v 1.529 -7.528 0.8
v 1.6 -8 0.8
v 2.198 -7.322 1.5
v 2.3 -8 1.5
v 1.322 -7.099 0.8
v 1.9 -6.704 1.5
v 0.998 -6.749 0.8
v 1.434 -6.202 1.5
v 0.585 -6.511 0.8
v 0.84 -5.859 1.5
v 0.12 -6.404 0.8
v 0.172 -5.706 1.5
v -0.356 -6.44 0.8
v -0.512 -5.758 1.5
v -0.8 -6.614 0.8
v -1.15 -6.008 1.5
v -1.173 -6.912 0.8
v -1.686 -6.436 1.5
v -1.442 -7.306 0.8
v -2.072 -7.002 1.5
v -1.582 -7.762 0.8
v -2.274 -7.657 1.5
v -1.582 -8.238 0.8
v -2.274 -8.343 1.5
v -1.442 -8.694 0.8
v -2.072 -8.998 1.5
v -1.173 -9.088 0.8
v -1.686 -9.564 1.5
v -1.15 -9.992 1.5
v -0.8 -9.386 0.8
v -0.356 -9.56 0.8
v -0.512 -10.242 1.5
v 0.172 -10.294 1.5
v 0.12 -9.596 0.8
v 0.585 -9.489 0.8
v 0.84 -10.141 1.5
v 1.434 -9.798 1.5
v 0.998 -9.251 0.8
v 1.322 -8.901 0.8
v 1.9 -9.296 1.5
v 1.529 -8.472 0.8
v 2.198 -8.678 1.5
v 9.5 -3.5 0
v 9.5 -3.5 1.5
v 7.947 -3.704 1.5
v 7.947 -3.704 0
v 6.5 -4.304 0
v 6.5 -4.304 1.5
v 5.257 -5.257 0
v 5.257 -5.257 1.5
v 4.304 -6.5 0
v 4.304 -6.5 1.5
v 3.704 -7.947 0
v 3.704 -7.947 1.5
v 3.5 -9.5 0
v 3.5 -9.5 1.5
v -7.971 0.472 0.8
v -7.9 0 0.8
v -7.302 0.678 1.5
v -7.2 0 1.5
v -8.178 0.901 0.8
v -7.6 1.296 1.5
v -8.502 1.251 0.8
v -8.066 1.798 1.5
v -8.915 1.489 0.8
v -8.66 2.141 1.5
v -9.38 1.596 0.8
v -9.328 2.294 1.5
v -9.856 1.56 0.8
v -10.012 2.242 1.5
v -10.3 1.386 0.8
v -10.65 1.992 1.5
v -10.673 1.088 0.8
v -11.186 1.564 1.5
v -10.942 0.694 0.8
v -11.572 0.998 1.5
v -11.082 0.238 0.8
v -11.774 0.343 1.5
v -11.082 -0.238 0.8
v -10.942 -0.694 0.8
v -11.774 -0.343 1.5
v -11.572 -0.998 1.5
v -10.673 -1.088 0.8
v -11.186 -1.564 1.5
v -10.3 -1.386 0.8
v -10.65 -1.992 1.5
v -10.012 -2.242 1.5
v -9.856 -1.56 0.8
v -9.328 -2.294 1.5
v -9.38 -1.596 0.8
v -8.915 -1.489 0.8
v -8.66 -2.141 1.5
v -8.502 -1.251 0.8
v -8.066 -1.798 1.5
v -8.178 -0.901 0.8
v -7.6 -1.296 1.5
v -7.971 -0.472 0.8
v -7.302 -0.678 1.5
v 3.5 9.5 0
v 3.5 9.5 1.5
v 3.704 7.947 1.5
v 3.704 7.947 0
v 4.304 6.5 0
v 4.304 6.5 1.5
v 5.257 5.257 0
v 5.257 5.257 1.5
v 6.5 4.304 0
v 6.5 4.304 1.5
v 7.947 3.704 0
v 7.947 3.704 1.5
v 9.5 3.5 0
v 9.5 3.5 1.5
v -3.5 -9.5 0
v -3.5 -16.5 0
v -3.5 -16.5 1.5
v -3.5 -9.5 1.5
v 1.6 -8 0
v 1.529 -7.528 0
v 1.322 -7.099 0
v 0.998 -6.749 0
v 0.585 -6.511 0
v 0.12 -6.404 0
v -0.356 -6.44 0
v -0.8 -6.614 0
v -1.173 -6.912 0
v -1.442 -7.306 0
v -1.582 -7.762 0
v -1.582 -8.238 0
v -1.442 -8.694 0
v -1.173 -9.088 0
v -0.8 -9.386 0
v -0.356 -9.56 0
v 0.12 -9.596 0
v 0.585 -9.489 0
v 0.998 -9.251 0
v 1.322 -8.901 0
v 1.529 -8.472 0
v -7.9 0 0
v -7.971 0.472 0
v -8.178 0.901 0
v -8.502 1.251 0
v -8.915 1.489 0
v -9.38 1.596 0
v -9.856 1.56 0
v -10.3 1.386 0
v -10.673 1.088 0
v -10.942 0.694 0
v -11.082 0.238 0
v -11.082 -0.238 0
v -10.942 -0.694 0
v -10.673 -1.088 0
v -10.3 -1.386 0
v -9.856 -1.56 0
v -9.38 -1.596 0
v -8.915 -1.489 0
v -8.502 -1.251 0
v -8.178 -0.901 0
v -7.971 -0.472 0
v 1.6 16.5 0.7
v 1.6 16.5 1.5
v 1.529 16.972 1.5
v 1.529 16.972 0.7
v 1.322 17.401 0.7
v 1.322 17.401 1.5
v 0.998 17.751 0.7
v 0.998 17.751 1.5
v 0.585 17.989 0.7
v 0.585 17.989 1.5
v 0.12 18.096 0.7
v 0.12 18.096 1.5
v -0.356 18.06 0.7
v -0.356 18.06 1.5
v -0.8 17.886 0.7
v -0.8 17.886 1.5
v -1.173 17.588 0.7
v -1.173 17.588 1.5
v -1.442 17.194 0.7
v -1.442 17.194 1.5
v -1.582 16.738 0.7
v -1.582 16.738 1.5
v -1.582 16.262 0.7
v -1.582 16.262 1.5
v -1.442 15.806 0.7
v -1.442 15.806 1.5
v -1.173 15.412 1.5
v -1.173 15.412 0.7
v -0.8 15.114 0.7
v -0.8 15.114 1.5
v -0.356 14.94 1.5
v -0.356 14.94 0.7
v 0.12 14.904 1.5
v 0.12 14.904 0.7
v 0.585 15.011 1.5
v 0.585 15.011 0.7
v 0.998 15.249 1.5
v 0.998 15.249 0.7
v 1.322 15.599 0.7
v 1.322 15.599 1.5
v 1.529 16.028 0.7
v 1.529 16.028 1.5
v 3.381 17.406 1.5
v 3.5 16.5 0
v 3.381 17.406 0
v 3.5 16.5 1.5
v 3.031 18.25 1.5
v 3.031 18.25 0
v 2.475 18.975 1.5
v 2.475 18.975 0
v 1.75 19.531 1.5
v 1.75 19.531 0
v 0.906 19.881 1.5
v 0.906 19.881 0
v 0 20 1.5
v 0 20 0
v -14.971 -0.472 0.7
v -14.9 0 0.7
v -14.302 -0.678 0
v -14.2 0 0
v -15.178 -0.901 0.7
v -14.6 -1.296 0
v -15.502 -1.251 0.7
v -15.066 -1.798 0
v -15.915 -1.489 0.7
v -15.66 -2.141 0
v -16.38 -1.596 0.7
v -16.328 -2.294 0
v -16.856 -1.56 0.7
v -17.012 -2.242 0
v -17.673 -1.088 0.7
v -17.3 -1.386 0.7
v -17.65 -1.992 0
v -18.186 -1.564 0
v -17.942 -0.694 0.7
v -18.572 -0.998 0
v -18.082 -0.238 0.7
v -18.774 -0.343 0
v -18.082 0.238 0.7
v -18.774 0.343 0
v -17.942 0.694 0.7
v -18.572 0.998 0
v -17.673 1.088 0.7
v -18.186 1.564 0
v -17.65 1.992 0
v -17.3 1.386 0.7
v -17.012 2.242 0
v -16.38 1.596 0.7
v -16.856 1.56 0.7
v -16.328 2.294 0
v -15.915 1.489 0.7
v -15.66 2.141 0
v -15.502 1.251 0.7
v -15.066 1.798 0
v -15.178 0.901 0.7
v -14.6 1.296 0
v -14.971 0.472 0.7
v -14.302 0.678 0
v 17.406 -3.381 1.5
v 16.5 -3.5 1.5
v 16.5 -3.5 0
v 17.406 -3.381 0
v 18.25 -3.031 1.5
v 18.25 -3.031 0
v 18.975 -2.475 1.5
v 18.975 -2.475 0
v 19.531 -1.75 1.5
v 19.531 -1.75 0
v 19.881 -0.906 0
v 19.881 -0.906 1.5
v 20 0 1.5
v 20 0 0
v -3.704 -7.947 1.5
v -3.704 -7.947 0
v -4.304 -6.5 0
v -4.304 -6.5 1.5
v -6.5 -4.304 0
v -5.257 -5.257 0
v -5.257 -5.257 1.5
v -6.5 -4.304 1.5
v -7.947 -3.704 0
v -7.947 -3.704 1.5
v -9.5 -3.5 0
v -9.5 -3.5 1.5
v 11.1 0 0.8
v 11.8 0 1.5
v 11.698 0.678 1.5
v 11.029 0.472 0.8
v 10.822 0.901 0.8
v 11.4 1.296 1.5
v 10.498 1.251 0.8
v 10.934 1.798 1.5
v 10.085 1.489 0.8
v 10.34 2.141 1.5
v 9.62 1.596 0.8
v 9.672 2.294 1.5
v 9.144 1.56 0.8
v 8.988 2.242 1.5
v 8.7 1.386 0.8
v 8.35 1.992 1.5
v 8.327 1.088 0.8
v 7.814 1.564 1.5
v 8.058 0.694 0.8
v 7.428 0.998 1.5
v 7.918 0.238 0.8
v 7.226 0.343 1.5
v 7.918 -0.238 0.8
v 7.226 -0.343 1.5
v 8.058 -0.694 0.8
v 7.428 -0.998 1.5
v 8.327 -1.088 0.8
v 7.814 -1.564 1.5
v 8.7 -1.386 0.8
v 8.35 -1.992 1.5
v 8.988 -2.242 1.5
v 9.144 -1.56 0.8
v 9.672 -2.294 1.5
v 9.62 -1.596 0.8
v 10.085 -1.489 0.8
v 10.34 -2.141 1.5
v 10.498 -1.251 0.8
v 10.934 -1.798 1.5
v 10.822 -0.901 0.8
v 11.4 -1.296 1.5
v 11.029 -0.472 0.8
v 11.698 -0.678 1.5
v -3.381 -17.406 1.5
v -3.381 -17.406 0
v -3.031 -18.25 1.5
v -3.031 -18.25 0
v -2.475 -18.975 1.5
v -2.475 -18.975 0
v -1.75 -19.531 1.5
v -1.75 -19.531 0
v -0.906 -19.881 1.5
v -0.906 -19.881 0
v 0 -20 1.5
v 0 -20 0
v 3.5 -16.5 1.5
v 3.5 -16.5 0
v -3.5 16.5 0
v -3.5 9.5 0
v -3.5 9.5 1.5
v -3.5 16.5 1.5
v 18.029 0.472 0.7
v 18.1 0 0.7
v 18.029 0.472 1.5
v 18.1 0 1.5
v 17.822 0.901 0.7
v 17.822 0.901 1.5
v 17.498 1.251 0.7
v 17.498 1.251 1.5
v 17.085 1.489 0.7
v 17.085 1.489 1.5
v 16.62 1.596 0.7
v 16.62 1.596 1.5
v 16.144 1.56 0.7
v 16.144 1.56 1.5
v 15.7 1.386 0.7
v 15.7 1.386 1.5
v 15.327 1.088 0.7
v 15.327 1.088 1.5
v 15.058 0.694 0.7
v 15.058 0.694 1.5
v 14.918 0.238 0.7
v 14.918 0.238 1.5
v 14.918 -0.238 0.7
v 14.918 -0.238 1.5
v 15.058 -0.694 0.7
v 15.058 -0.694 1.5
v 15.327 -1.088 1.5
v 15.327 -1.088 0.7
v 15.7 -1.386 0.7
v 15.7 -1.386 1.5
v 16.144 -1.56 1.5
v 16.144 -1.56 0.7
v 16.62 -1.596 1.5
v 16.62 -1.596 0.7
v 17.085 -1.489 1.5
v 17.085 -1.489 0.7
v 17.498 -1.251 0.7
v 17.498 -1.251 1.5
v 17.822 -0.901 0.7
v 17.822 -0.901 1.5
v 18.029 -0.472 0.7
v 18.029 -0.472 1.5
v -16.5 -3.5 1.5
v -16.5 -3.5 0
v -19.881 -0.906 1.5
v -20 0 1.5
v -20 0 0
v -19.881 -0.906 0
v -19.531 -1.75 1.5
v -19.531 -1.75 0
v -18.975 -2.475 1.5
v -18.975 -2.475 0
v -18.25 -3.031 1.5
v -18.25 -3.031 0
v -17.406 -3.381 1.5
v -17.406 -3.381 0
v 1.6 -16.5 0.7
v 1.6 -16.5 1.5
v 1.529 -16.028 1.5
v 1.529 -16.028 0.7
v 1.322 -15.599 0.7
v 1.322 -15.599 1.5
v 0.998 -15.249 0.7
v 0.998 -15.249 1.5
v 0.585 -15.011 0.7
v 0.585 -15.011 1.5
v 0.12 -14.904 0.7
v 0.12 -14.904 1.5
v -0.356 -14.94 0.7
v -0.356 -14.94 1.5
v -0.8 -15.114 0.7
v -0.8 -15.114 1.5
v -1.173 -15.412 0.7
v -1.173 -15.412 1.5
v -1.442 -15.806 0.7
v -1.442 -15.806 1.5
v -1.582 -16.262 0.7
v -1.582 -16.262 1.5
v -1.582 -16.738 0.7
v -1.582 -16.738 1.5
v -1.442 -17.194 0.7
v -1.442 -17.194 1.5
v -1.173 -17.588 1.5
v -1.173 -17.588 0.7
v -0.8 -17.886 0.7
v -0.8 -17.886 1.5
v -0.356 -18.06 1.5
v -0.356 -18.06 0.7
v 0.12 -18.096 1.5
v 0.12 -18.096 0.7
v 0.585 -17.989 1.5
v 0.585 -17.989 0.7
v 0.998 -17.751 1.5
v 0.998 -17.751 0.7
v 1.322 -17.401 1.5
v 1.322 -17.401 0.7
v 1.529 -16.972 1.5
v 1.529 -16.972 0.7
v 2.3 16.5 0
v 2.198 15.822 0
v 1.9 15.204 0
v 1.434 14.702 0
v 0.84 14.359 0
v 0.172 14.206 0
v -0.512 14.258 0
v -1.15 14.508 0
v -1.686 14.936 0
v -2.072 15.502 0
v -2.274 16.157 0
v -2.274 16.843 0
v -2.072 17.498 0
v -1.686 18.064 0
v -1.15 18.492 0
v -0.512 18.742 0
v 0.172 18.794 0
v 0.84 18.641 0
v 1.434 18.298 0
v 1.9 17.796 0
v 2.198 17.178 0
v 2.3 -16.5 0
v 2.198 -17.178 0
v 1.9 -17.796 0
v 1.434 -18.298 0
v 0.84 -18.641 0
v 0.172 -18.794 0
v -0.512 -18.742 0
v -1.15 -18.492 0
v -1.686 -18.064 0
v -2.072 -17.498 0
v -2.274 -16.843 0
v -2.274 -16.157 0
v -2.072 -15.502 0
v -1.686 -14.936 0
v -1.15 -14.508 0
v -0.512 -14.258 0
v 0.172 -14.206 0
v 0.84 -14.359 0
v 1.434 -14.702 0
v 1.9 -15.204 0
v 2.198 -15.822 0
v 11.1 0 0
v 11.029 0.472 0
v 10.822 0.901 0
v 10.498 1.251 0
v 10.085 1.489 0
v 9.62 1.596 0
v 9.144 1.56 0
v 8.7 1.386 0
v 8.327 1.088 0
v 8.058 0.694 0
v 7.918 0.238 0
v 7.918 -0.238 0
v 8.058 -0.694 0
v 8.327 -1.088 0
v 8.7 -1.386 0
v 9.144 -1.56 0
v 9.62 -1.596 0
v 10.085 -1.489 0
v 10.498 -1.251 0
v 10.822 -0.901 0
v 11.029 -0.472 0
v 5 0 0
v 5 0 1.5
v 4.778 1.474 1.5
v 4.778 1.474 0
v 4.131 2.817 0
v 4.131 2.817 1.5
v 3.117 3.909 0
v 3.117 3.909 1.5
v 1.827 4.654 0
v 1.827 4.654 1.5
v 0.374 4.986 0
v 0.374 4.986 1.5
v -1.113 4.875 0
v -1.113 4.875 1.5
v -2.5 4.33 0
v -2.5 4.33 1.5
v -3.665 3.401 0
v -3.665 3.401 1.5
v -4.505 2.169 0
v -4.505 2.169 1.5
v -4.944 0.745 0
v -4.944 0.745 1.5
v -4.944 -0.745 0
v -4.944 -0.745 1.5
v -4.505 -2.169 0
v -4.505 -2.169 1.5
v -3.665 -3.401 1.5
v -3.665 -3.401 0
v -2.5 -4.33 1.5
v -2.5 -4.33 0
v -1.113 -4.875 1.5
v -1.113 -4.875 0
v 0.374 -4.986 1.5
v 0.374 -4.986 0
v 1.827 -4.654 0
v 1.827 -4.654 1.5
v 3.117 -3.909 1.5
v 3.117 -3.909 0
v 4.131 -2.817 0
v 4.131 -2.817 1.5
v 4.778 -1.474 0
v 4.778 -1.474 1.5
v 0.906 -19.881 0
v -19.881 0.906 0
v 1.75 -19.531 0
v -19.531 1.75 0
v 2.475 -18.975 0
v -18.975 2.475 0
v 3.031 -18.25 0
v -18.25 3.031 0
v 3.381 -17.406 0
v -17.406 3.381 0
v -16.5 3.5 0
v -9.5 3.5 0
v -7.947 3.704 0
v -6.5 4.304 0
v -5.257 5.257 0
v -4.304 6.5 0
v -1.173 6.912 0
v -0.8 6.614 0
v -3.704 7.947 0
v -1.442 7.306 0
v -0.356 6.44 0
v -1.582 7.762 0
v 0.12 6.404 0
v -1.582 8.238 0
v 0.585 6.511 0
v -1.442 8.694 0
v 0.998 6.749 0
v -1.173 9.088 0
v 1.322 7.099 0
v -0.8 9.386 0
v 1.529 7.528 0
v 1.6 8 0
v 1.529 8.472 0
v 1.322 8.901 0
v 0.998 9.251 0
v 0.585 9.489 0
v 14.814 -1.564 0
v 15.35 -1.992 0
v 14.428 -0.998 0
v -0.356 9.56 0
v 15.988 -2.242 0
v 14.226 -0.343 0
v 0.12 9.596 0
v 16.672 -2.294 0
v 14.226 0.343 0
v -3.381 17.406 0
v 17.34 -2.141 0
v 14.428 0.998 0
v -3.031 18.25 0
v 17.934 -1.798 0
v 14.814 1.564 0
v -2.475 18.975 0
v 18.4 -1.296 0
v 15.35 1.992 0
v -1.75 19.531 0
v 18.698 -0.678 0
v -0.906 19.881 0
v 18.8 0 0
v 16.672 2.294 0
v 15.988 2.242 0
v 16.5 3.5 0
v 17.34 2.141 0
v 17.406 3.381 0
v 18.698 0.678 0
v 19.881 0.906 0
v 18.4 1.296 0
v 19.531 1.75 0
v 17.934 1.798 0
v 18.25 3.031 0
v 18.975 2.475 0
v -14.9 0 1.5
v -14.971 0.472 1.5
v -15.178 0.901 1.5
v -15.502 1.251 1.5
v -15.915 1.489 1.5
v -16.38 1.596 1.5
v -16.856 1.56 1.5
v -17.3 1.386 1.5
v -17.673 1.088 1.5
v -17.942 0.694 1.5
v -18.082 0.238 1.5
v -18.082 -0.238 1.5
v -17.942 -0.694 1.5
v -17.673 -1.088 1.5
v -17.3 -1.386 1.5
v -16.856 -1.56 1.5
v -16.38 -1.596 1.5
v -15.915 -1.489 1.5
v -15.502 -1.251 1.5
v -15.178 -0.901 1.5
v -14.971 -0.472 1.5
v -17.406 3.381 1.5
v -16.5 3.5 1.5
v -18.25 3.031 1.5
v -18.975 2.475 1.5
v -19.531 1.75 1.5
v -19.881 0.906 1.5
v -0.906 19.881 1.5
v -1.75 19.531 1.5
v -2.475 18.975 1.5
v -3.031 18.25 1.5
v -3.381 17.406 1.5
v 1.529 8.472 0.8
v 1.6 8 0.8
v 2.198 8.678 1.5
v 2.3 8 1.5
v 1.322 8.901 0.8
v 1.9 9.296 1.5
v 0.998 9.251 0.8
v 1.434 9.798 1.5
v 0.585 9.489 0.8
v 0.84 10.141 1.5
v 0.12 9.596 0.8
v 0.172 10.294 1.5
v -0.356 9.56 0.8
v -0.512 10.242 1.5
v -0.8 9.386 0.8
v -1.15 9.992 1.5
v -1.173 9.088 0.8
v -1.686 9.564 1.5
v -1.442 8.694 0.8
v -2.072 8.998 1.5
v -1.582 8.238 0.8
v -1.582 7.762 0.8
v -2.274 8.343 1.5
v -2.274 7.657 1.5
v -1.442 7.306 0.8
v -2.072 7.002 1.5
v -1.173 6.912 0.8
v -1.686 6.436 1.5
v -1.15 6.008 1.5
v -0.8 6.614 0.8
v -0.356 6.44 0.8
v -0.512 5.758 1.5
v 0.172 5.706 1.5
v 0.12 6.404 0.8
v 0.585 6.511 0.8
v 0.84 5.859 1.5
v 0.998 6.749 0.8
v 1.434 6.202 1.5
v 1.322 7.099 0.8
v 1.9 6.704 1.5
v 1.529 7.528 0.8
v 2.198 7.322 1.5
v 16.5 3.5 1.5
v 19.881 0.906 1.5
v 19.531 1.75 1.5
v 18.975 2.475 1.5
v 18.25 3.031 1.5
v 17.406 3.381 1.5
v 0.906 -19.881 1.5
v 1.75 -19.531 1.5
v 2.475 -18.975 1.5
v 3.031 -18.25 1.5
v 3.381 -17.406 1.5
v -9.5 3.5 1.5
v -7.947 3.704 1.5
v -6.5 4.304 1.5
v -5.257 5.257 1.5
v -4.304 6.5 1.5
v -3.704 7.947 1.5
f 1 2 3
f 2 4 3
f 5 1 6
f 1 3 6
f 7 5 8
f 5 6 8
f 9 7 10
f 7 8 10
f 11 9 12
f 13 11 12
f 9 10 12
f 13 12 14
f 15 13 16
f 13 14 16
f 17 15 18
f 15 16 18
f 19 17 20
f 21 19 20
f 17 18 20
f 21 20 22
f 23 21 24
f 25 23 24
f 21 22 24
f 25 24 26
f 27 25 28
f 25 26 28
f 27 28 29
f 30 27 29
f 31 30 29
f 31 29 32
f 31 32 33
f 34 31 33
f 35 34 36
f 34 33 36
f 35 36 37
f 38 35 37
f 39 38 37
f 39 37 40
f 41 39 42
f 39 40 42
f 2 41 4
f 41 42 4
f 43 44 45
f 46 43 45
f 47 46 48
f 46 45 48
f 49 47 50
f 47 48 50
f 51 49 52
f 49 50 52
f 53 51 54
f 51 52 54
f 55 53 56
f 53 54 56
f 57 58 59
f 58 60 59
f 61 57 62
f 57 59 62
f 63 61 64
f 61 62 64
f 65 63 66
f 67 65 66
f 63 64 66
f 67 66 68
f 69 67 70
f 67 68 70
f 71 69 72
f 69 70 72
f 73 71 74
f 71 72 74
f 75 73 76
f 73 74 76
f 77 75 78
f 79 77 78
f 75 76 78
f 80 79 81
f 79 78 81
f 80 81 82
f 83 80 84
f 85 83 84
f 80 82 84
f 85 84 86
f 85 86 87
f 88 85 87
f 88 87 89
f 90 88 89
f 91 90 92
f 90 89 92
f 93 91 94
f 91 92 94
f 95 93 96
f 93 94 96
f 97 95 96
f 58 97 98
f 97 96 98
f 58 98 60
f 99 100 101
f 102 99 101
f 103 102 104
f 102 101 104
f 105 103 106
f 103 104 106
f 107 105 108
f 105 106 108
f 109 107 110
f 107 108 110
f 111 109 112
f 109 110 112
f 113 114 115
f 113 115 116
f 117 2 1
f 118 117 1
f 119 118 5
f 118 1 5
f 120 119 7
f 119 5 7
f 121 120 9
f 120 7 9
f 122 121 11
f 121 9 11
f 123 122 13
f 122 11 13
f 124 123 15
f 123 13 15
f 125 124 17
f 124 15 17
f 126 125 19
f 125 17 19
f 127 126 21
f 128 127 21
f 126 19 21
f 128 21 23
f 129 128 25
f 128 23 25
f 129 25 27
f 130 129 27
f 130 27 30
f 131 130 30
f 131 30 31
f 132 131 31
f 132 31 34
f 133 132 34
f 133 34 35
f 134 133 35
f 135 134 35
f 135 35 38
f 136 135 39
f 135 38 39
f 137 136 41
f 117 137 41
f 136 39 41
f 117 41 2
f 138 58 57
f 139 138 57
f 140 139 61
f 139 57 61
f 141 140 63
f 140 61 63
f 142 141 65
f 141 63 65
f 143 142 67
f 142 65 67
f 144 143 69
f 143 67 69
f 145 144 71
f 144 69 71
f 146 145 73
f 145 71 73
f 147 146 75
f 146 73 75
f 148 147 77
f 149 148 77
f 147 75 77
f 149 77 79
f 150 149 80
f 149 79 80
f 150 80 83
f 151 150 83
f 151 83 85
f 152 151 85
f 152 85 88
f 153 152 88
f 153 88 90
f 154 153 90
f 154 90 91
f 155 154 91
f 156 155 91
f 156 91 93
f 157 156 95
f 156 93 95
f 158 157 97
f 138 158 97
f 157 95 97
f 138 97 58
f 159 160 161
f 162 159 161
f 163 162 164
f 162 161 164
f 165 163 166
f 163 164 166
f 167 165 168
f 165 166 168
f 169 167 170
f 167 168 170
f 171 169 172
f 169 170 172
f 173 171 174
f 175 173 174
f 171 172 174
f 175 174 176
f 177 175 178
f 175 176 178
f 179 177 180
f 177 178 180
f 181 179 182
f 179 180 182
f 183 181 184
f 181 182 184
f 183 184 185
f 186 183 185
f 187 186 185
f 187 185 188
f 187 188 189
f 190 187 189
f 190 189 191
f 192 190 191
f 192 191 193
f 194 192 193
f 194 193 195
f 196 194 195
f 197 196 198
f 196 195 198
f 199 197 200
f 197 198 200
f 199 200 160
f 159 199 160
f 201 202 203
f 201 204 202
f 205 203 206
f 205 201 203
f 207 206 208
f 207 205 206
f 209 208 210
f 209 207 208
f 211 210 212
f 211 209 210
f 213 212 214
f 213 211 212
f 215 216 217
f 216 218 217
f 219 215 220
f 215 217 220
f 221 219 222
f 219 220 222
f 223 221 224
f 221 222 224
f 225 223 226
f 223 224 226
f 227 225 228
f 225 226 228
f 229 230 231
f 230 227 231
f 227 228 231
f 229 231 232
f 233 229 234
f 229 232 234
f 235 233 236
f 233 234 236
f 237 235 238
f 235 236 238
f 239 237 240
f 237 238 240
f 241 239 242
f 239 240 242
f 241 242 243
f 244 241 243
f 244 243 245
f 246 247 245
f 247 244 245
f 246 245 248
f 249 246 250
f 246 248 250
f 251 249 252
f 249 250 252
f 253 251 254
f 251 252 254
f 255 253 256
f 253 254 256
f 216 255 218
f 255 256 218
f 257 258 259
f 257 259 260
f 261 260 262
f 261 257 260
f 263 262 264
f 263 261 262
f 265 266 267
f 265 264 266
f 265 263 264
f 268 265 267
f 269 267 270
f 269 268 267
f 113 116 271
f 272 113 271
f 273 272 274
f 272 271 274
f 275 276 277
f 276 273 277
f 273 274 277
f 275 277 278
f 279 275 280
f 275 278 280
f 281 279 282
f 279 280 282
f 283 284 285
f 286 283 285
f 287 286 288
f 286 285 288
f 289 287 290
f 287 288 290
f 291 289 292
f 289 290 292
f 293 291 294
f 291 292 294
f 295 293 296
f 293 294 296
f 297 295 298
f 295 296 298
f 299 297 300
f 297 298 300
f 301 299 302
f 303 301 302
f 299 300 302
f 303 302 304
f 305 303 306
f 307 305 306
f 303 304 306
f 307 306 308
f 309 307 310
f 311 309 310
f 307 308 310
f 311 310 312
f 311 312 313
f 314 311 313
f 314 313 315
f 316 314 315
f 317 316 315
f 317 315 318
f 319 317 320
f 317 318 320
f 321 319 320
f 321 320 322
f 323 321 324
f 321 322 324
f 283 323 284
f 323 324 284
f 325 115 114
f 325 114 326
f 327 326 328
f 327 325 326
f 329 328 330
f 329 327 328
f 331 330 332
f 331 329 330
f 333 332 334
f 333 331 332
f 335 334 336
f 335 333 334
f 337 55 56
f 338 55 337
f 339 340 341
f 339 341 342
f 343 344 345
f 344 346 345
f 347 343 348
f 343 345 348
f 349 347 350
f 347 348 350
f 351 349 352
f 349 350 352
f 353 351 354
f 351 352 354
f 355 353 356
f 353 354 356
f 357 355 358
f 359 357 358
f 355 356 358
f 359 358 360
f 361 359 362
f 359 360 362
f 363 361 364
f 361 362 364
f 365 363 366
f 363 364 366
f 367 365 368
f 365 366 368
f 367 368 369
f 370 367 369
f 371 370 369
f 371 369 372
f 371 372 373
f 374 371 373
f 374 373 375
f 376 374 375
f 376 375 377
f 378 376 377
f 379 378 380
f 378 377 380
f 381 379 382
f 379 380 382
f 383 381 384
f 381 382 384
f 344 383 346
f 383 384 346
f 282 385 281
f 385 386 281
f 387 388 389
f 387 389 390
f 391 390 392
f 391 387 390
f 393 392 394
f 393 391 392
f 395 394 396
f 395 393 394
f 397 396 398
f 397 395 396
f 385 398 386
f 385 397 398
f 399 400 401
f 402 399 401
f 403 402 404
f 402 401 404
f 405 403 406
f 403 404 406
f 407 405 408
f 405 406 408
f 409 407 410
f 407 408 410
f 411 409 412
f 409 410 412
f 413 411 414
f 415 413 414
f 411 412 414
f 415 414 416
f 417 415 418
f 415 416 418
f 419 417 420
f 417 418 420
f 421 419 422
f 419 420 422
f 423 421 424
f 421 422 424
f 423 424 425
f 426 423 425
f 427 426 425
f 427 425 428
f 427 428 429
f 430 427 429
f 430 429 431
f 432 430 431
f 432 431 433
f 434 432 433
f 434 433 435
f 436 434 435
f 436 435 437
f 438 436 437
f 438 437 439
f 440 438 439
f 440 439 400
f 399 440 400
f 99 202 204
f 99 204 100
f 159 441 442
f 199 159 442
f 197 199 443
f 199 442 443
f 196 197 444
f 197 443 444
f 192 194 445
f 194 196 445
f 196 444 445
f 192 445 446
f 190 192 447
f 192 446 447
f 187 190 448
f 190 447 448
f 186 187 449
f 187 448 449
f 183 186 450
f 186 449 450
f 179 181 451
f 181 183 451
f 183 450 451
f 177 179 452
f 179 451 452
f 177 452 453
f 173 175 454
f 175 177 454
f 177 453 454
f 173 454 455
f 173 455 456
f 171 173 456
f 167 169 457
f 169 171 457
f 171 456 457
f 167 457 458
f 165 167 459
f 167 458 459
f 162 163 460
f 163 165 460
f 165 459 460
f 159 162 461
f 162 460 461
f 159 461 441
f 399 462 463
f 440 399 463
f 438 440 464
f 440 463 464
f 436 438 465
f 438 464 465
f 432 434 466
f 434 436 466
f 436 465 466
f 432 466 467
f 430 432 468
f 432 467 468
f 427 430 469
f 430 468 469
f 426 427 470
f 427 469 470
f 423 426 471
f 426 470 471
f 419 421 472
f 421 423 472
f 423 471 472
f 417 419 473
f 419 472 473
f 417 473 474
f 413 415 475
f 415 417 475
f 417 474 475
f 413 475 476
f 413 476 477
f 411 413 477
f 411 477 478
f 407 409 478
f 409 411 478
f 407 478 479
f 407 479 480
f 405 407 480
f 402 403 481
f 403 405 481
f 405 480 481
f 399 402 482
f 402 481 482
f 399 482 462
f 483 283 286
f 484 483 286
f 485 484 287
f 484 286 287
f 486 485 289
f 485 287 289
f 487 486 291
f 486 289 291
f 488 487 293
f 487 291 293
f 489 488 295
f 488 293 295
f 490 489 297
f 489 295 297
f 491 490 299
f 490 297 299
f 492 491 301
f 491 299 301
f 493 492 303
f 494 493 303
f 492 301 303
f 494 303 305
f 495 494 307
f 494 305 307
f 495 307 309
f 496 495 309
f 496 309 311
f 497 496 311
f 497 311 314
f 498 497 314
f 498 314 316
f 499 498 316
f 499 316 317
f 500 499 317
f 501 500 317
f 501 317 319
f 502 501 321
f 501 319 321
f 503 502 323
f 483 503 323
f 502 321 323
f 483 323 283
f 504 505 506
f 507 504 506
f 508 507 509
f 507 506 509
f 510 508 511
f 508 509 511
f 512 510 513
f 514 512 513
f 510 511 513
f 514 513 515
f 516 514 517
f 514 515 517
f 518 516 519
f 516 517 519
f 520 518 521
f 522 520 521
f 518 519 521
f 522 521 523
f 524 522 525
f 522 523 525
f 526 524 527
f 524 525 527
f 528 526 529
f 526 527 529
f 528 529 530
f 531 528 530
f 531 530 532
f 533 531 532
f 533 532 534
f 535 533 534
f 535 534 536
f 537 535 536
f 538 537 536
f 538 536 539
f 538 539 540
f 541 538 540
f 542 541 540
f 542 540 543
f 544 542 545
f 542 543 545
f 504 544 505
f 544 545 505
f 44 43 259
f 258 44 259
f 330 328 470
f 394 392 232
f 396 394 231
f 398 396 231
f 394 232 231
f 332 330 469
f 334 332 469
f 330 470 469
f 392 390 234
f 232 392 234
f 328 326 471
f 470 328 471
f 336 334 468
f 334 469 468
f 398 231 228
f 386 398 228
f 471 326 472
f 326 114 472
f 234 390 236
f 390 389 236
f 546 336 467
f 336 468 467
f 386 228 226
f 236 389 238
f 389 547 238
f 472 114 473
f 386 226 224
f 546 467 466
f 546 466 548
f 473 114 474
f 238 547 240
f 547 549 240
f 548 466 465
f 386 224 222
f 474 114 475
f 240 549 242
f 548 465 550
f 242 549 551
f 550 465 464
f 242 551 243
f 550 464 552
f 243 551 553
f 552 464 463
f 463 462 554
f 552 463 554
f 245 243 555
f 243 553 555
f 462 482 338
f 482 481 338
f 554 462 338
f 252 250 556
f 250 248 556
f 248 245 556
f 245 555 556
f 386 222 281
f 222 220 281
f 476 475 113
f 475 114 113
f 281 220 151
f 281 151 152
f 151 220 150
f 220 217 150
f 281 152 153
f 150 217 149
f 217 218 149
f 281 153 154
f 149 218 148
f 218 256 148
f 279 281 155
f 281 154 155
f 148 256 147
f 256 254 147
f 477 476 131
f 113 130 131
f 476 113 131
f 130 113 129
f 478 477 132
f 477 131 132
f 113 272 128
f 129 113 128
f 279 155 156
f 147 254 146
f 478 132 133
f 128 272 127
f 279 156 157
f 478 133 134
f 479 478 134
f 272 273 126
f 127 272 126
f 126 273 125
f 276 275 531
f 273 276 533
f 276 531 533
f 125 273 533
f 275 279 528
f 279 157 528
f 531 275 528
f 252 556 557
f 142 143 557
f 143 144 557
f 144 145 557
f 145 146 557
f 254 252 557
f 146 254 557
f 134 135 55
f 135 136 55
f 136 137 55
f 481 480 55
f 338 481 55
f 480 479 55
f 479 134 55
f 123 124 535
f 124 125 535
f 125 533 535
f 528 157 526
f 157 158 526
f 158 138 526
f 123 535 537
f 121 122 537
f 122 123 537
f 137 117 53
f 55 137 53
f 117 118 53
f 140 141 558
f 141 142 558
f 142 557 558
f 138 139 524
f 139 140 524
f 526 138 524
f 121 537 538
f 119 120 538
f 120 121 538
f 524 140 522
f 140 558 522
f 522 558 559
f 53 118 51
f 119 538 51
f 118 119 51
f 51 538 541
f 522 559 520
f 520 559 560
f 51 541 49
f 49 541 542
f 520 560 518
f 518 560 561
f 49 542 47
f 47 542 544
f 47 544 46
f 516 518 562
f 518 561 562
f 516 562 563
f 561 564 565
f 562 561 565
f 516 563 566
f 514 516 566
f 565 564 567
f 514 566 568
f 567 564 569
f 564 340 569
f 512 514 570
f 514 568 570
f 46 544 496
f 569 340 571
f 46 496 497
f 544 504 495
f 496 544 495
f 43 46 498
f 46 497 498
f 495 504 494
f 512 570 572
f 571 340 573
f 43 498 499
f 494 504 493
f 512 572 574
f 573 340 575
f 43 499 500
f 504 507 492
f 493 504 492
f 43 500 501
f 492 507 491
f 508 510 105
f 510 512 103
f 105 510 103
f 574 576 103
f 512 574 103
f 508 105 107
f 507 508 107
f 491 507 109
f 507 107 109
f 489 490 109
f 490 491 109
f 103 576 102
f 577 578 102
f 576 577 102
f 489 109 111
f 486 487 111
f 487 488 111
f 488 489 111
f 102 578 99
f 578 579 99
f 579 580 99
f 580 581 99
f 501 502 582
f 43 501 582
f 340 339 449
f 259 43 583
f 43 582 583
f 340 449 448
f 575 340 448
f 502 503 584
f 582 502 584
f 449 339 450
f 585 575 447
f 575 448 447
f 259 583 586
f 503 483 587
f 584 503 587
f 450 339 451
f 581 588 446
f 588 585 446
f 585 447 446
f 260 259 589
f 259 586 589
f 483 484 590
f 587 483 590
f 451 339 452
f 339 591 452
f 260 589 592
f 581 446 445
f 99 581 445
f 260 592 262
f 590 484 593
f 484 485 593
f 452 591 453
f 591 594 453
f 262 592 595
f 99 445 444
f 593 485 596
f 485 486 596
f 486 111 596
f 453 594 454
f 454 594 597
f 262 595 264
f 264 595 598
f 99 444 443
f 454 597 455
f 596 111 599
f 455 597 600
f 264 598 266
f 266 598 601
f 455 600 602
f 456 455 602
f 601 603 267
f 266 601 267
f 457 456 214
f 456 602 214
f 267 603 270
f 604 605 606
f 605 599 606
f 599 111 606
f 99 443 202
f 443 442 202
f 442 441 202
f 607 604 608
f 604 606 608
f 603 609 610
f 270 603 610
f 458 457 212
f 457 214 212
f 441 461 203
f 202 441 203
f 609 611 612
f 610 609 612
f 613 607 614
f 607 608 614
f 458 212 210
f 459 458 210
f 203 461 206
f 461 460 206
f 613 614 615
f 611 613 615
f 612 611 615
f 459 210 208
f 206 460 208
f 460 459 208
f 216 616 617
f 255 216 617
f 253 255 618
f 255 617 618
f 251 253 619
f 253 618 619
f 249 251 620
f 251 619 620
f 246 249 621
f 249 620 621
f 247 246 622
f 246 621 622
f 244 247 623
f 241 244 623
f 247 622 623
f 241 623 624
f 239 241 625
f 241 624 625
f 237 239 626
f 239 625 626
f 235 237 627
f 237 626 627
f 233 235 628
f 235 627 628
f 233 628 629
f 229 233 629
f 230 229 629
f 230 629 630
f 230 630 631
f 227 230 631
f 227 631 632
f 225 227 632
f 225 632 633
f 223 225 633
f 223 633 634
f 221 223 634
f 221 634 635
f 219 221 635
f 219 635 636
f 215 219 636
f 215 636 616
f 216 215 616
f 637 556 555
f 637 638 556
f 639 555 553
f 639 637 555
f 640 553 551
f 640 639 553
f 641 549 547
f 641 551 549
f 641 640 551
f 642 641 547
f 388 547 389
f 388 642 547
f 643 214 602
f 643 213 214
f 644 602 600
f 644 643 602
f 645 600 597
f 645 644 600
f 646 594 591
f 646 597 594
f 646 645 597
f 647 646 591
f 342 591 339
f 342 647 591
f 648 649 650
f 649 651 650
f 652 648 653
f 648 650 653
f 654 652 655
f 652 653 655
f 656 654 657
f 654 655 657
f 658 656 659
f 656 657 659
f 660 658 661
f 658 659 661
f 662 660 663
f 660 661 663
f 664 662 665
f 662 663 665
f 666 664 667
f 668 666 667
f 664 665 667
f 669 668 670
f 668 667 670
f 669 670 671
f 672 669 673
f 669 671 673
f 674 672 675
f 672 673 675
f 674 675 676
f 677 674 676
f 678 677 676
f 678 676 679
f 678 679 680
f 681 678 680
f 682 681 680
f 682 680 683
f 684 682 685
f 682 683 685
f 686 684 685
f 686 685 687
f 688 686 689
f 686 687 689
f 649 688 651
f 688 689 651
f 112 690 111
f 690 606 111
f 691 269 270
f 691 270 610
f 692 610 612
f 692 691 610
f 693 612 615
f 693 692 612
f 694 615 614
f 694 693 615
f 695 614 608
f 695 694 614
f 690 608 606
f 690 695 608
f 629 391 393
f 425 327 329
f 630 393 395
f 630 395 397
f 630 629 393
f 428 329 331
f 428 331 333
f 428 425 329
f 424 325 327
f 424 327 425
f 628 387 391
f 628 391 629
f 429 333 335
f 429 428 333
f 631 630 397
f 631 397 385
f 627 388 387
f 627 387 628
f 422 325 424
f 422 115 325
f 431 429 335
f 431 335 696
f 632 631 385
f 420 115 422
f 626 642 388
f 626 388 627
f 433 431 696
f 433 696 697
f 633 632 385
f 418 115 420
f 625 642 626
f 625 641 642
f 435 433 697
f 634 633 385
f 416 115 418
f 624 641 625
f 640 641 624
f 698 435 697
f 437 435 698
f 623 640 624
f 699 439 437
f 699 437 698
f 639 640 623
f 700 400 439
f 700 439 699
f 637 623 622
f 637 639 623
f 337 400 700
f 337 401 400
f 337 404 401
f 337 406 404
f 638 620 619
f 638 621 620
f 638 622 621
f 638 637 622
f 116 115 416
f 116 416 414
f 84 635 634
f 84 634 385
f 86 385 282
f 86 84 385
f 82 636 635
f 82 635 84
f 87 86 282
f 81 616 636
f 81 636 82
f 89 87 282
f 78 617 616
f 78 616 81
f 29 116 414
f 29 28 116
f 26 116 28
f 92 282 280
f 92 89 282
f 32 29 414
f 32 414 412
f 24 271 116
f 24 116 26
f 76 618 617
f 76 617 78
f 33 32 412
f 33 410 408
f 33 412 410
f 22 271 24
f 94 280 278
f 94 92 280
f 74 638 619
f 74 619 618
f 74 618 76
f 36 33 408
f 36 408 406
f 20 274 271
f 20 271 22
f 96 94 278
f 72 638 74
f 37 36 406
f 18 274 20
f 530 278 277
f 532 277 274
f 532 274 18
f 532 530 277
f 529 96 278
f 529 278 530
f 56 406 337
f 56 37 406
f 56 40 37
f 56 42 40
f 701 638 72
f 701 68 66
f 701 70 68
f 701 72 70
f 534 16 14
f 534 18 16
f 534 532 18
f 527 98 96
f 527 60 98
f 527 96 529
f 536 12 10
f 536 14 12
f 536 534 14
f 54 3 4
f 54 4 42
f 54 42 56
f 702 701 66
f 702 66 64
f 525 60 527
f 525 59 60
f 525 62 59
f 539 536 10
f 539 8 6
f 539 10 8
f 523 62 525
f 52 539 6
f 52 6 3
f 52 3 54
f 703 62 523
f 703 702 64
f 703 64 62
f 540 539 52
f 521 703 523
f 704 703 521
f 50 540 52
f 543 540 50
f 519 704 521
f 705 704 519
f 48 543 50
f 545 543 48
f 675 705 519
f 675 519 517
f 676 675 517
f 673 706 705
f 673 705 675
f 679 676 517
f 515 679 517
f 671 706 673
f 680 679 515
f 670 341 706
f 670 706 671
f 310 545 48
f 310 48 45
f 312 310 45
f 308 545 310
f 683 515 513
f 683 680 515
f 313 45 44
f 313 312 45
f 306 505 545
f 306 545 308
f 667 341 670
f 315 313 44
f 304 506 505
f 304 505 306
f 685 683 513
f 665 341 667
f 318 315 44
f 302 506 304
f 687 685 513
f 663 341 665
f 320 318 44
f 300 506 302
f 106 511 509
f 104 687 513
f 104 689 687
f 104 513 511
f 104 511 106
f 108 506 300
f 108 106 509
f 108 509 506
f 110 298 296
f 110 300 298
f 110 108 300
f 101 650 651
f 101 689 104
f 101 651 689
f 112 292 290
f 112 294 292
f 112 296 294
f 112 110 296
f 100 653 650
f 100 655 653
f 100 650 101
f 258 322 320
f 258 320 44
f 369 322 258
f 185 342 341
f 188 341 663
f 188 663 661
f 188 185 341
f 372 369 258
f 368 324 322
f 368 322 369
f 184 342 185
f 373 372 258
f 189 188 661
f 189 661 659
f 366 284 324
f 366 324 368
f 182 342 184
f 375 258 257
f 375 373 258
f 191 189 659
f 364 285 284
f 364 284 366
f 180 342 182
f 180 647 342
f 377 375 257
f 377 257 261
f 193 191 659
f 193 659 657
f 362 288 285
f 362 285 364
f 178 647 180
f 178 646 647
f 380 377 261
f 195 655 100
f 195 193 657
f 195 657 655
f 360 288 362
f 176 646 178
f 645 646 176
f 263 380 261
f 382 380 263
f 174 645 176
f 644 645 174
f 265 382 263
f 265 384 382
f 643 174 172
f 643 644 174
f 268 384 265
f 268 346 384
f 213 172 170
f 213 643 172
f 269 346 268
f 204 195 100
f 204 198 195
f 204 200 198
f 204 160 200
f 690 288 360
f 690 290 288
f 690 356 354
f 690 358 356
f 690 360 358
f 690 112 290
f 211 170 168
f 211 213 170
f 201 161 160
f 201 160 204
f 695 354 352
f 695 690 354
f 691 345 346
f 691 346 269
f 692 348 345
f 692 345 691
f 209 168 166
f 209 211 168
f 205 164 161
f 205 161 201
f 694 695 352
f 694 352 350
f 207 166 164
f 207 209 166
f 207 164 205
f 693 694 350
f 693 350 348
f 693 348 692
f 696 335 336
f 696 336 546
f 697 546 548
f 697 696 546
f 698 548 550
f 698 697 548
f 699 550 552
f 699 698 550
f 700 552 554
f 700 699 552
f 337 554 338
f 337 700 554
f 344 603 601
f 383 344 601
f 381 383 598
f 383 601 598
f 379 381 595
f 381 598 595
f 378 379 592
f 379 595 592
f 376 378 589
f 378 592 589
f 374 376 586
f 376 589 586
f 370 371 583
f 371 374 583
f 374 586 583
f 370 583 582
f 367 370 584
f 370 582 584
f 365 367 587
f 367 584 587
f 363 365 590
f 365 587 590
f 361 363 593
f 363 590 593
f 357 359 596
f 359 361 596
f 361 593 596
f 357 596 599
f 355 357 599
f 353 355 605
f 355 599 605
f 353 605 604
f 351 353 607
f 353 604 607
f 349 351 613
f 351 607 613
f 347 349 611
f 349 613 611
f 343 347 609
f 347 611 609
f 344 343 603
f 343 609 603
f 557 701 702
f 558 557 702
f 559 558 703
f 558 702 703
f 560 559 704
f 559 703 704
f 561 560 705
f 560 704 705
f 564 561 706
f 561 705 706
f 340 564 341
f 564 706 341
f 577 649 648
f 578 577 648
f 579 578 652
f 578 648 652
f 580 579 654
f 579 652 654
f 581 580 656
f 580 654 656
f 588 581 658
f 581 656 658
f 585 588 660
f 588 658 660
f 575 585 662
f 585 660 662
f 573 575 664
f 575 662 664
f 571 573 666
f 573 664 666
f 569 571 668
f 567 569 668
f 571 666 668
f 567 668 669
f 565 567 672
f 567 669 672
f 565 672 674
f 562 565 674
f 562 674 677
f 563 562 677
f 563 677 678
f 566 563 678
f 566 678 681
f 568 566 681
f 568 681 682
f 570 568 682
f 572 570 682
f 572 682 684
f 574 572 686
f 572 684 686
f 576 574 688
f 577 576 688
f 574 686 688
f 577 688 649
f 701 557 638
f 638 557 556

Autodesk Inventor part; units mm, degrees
ref_plane "YZ Plane" through (0, 0, 0) normal (1, 0, 0) x (0, 1, 0)
ref_plane "XZ Plane" through (0, 0, 0) normal (0, 1, 0) x (-1, 0, 0)
ref_plane "XY Plane" through (0, 0, 0) normal (0, 0, 1) x (1, 0, 0)
sketch "Skizze1" plane through (0, 0, 0) normal (0, 0, 1) x (1, 0, 0)
  line L0 (-20, -3.5) -> (20, -3.5)
  line L1 (20, -3.5) -> (20, 3.5)
  line L2 (20, 3.5) -> (-20, 3.5)
  line L3 (-20, 3.5) -> (-20, -3.5)
  line L4 (-20, -3.5) -> (20, 3.5) construction
  line L5 (20, -3.5) -> (-20, 3.5) construction
  line L6 (3.5, -20) -> (-3.5, -20)
  line L7 (-3.5, -20) -> (-3.5, 20)
  line L8 (-3.5, 20) -> (3.5, 20)
  line L9 (3.5, 20) -> (3.5, -20)
  line L10 (3.5, -20) -> (-3.5, 20) construction
  line L11 (-3.5, -20) -> (3.5, 20) construction
  point P0 (0, 0)
  dimension "d0" = 7
  dimension "d1" = 40
extrude "Extrusion1" add sketch "Skizze1" along normal blind 1.5
fillet "Rundung1" radius 3.5 8 edges at (3.5, 20, 0.75) (-3.5, 20, 0.75) (20, 3.5, 0.75) (20, -3.5, 0.75) (3.5, -20, 0.75) (-3.5, -20, 0.75) (-20, -3.5, 0.75) (-20, 3.5, 0.75)
fillet "Rundung2" radius 6 4 edges at (3.5, 3.5, 0.75) (-3.5, 3.5, 0.75) (-3.5, -3.5, 0.75) (3.5, -3.5, 0.75)
sketch "Skizze2" plane through (0, 0, 1.5) normal (0, 0, 1) x (1, 0, 0)
  circle A0 centre (0, 0) radius 5
  circle A1 centre (16.5, 0) radius 1.6
  circle A2 centre (-16.5, 0) radius 1.6
  circle A3 centre (0, 16.5) radius 1.6
  circle A4 centre (0, -16.5) radius 1.6
  circle A5 centre (0, -8) radius 1.6
  circle A6 centre (0, 8) radius 1.6
  circle A7 centre (-9.5, 0) radius 1.6
  circle A8 centre (9.5, 0) radius 1.6
  line L0 (0, 16.5) -> (0, -16.5) construction
  line L1 (-16.5, 0) -> (16.5, 0) construction
  line L2 (9.5, 0) -> (-9.5, 0) construction
  line L3 (0, 8) -> (0, -8) construction
  dimension "d6" = 3.2
  dimension "d7" = 10
  dimension "d8" = 33
  dimension "d9" = 19
  dimension "d10" = 16
extrude "Extrusion2" cut sketch "Skizze2" against normal blind 1.5
chamfer "Fase1" distance 0.7 angle 45 4 edges at (-1.6, -8, 1.5) (-11.1, 0, 1.5) (-1.6, 8, 1.5) (7.9, 0, 1.5)
chamfer "Fase2" distance 0.7 angle 45 4 edges at (-1.6, 16.5, 0) (-18.1, 0, 0) (-1.6, -16.5, 0) (14.9, 0, 0)
equation "\"G_L\" = 0"
equation "\"G_H\" = 0"
equation "\"G_B\" = 0"
properties part number "Motorkreuz_klein" material "GEDA Stahl"
